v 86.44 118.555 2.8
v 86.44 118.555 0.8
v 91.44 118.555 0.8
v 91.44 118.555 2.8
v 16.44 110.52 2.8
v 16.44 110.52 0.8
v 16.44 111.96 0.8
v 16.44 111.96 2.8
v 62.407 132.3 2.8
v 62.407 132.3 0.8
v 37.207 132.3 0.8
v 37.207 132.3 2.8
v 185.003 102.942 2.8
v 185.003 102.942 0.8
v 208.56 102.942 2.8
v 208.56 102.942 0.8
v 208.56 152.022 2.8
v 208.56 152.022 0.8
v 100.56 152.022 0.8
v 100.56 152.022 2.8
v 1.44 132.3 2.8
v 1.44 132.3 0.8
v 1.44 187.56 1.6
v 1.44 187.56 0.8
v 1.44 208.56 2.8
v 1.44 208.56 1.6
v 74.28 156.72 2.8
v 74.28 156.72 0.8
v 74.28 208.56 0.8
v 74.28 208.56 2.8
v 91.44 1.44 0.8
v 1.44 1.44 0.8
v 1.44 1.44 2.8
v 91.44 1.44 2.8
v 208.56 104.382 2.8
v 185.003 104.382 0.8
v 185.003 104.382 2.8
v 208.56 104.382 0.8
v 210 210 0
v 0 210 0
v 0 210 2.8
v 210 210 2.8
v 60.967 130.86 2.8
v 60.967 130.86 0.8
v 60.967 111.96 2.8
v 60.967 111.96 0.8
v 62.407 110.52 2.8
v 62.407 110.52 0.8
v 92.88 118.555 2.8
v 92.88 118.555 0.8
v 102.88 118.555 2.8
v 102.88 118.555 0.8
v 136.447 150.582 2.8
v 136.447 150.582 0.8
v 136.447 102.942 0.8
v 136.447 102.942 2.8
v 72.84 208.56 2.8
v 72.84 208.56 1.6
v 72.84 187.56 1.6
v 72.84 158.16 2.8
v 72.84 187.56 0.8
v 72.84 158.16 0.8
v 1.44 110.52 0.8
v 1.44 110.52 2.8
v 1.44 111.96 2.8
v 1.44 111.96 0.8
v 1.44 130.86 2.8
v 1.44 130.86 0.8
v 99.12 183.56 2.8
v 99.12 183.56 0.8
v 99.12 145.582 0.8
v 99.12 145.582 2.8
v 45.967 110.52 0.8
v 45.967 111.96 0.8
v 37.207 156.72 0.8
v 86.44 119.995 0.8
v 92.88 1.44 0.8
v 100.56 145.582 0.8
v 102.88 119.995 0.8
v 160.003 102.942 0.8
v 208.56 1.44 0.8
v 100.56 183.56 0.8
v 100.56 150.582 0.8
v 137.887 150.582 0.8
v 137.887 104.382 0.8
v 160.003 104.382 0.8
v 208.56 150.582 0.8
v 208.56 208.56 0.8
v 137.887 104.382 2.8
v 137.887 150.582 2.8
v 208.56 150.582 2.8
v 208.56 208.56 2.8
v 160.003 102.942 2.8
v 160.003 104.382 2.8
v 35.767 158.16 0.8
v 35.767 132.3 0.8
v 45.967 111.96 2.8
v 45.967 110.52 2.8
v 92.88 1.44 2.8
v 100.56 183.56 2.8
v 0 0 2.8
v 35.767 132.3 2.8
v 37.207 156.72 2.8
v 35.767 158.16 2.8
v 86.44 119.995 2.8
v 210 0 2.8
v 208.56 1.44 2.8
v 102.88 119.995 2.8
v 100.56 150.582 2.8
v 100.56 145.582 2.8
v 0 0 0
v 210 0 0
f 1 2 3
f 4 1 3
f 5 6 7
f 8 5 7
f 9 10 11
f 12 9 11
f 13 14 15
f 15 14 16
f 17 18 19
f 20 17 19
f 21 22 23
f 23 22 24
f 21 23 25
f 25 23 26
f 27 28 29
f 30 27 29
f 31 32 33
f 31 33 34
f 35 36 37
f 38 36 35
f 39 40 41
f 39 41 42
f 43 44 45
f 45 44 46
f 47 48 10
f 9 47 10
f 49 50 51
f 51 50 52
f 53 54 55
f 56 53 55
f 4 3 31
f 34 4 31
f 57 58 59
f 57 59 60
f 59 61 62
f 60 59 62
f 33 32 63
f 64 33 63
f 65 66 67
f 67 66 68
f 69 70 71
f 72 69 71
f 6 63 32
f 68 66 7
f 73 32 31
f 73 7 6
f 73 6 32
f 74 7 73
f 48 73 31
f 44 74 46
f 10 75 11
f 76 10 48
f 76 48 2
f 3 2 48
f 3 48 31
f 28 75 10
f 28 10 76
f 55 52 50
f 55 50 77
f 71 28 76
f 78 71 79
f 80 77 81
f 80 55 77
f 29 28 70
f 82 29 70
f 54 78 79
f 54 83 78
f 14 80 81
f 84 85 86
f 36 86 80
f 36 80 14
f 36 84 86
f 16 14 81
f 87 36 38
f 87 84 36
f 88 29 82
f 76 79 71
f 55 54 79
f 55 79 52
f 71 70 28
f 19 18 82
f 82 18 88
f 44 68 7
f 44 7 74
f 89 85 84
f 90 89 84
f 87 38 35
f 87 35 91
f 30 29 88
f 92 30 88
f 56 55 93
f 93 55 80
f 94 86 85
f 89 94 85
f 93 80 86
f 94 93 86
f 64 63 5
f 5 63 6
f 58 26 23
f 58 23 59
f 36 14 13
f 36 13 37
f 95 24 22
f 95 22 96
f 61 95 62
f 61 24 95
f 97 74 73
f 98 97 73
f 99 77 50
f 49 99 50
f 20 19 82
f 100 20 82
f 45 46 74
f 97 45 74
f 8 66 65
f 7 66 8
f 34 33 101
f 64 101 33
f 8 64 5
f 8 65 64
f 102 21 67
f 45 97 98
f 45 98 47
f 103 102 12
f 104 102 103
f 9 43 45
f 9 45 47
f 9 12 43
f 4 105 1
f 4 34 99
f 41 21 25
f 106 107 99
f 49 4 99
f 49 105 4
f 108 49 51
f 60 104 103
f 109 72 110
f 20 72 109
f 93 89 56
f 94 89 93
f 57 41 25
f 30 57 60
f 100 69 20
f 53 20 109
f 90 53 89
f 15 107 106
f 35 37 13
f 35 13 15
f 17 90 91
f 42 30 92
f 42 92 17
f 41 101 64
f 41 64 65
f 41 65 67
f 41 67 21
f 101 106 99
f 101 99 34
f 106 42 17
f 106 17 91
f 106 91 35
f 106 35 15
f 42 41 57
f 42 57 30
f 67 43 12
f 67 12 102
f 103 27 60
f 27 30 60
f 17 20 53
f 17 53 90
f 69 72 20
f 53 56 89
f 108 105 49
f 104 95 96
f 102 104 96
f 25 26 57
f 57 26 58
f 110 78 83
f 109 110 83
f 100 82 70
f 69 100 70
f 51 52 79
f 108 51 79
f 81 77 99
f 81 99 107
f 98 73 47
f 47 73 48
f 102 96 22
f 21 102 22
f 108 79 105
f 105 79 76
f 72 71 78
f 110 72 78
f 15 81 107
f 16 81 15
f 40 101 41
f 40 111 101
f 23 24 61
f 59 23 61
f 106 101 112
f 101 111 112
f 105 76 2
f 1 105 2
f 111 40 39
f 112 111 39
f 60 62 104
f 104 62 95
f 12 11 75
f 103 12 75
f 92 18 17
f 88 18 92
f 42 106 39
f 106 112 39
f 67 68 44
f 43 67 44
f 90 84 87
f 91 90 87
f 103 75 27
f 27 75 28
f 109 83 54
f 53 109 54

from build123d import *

# Parameters (mm, degrees)
F0_W     = 210
F0_H     = 210
F1_DEPTH = 0.8
F2_W     = 210
F2_H     = 210
F2_W_2   = 207.12
F2_H_2   = 207.12
F3_DEPTH = 2
F4_W     = 15
F4_H     = 1.44
F4_W_2   = 23.556538
F5_DEPTH = 2
F6_W     = 71.4
F6_H     = 21
F7_DEPTH = 0.8


with BuildPart() as f1:
    # F0 (on Top) → F1 (new body)
    with BuildSketch(Plane.XY):
        with Locations((105, 105)):
            Rectangle(F0_W, F0_H)
    extrude(amount=F1_DEPTH)

    # F2 (on face) → F3 (join)
    with BuildSketch(Plane.XY.offset(0.8)):
        with Locations((105, 105)):
            Rectangle(F2_W, F2_H)
        with Locations((105, 105)):
            Rectangle(F2_W_2, F2_H_2, mode=Mode.SUBTRACT)
    extrude(amount=F3_DEPTH)

    # F4 (on face) → F5 (join, through all)
    with BuildSketch(Plane.XY.offset(0.8)):
        Polygon((74.28, 156.72), (74.28, 208.56), (72.84, 208.56), (72.84, 158.16), (35.766923, 158.16), (35.766923, 132.3), (1.44, 132.3), (1.44, 130.86), (35.766923, 130.86), (60.966923, 130.86), (60.966923, 111.96), (45.966923, 111.96), (45.966923, 110.52), (62.406923, 110.52), (62.406923, 130.86), (62.406923, 132.3), (37.206923, 132.3), (37.206923, 156.72), align=None)
        with Locations((8.94, 111.24)):
            Rectangle(F4_W, F4_H)
        Polygon((208.56, 150.581538), (208.56, 152.021538), (100.56, 152.021538), (100.56, 183.56), (99.12, 183.56), (99.12, 145.581538), (100.56, 145.581538), (100.56, 150.581538), (136.446923, 150.581538), (136.446923, 102.941538), (160.003462, 102.941538), (160.003462, 104.381538), (137.886923, 104.381538), (137.886923, 150.581538), align=None)
        with Locations((196.781731, 103.661538)):
            Rectangle(F4_W_2, F4_H)
        Polygon((91.44, 1.44), (92.88, 1.44), (92.88, 118.555385), (102.88, 118.555385), (102.88, 119.995385), (86.44, 119.995385), (86.44, 118.555385), (91.44, 118.555385), align=None)
    extrude(amount=F5_DEPTH)

    # F6 (on face) → F7 (join)
    with BuildSketch(Plane.XY.offset(0.8)):
        with Locations((37.14, 198.06)):
            Rectangle(F6_W, F6_H)
    extrude(amount=F7_DEPTH)


solid = f1.part
